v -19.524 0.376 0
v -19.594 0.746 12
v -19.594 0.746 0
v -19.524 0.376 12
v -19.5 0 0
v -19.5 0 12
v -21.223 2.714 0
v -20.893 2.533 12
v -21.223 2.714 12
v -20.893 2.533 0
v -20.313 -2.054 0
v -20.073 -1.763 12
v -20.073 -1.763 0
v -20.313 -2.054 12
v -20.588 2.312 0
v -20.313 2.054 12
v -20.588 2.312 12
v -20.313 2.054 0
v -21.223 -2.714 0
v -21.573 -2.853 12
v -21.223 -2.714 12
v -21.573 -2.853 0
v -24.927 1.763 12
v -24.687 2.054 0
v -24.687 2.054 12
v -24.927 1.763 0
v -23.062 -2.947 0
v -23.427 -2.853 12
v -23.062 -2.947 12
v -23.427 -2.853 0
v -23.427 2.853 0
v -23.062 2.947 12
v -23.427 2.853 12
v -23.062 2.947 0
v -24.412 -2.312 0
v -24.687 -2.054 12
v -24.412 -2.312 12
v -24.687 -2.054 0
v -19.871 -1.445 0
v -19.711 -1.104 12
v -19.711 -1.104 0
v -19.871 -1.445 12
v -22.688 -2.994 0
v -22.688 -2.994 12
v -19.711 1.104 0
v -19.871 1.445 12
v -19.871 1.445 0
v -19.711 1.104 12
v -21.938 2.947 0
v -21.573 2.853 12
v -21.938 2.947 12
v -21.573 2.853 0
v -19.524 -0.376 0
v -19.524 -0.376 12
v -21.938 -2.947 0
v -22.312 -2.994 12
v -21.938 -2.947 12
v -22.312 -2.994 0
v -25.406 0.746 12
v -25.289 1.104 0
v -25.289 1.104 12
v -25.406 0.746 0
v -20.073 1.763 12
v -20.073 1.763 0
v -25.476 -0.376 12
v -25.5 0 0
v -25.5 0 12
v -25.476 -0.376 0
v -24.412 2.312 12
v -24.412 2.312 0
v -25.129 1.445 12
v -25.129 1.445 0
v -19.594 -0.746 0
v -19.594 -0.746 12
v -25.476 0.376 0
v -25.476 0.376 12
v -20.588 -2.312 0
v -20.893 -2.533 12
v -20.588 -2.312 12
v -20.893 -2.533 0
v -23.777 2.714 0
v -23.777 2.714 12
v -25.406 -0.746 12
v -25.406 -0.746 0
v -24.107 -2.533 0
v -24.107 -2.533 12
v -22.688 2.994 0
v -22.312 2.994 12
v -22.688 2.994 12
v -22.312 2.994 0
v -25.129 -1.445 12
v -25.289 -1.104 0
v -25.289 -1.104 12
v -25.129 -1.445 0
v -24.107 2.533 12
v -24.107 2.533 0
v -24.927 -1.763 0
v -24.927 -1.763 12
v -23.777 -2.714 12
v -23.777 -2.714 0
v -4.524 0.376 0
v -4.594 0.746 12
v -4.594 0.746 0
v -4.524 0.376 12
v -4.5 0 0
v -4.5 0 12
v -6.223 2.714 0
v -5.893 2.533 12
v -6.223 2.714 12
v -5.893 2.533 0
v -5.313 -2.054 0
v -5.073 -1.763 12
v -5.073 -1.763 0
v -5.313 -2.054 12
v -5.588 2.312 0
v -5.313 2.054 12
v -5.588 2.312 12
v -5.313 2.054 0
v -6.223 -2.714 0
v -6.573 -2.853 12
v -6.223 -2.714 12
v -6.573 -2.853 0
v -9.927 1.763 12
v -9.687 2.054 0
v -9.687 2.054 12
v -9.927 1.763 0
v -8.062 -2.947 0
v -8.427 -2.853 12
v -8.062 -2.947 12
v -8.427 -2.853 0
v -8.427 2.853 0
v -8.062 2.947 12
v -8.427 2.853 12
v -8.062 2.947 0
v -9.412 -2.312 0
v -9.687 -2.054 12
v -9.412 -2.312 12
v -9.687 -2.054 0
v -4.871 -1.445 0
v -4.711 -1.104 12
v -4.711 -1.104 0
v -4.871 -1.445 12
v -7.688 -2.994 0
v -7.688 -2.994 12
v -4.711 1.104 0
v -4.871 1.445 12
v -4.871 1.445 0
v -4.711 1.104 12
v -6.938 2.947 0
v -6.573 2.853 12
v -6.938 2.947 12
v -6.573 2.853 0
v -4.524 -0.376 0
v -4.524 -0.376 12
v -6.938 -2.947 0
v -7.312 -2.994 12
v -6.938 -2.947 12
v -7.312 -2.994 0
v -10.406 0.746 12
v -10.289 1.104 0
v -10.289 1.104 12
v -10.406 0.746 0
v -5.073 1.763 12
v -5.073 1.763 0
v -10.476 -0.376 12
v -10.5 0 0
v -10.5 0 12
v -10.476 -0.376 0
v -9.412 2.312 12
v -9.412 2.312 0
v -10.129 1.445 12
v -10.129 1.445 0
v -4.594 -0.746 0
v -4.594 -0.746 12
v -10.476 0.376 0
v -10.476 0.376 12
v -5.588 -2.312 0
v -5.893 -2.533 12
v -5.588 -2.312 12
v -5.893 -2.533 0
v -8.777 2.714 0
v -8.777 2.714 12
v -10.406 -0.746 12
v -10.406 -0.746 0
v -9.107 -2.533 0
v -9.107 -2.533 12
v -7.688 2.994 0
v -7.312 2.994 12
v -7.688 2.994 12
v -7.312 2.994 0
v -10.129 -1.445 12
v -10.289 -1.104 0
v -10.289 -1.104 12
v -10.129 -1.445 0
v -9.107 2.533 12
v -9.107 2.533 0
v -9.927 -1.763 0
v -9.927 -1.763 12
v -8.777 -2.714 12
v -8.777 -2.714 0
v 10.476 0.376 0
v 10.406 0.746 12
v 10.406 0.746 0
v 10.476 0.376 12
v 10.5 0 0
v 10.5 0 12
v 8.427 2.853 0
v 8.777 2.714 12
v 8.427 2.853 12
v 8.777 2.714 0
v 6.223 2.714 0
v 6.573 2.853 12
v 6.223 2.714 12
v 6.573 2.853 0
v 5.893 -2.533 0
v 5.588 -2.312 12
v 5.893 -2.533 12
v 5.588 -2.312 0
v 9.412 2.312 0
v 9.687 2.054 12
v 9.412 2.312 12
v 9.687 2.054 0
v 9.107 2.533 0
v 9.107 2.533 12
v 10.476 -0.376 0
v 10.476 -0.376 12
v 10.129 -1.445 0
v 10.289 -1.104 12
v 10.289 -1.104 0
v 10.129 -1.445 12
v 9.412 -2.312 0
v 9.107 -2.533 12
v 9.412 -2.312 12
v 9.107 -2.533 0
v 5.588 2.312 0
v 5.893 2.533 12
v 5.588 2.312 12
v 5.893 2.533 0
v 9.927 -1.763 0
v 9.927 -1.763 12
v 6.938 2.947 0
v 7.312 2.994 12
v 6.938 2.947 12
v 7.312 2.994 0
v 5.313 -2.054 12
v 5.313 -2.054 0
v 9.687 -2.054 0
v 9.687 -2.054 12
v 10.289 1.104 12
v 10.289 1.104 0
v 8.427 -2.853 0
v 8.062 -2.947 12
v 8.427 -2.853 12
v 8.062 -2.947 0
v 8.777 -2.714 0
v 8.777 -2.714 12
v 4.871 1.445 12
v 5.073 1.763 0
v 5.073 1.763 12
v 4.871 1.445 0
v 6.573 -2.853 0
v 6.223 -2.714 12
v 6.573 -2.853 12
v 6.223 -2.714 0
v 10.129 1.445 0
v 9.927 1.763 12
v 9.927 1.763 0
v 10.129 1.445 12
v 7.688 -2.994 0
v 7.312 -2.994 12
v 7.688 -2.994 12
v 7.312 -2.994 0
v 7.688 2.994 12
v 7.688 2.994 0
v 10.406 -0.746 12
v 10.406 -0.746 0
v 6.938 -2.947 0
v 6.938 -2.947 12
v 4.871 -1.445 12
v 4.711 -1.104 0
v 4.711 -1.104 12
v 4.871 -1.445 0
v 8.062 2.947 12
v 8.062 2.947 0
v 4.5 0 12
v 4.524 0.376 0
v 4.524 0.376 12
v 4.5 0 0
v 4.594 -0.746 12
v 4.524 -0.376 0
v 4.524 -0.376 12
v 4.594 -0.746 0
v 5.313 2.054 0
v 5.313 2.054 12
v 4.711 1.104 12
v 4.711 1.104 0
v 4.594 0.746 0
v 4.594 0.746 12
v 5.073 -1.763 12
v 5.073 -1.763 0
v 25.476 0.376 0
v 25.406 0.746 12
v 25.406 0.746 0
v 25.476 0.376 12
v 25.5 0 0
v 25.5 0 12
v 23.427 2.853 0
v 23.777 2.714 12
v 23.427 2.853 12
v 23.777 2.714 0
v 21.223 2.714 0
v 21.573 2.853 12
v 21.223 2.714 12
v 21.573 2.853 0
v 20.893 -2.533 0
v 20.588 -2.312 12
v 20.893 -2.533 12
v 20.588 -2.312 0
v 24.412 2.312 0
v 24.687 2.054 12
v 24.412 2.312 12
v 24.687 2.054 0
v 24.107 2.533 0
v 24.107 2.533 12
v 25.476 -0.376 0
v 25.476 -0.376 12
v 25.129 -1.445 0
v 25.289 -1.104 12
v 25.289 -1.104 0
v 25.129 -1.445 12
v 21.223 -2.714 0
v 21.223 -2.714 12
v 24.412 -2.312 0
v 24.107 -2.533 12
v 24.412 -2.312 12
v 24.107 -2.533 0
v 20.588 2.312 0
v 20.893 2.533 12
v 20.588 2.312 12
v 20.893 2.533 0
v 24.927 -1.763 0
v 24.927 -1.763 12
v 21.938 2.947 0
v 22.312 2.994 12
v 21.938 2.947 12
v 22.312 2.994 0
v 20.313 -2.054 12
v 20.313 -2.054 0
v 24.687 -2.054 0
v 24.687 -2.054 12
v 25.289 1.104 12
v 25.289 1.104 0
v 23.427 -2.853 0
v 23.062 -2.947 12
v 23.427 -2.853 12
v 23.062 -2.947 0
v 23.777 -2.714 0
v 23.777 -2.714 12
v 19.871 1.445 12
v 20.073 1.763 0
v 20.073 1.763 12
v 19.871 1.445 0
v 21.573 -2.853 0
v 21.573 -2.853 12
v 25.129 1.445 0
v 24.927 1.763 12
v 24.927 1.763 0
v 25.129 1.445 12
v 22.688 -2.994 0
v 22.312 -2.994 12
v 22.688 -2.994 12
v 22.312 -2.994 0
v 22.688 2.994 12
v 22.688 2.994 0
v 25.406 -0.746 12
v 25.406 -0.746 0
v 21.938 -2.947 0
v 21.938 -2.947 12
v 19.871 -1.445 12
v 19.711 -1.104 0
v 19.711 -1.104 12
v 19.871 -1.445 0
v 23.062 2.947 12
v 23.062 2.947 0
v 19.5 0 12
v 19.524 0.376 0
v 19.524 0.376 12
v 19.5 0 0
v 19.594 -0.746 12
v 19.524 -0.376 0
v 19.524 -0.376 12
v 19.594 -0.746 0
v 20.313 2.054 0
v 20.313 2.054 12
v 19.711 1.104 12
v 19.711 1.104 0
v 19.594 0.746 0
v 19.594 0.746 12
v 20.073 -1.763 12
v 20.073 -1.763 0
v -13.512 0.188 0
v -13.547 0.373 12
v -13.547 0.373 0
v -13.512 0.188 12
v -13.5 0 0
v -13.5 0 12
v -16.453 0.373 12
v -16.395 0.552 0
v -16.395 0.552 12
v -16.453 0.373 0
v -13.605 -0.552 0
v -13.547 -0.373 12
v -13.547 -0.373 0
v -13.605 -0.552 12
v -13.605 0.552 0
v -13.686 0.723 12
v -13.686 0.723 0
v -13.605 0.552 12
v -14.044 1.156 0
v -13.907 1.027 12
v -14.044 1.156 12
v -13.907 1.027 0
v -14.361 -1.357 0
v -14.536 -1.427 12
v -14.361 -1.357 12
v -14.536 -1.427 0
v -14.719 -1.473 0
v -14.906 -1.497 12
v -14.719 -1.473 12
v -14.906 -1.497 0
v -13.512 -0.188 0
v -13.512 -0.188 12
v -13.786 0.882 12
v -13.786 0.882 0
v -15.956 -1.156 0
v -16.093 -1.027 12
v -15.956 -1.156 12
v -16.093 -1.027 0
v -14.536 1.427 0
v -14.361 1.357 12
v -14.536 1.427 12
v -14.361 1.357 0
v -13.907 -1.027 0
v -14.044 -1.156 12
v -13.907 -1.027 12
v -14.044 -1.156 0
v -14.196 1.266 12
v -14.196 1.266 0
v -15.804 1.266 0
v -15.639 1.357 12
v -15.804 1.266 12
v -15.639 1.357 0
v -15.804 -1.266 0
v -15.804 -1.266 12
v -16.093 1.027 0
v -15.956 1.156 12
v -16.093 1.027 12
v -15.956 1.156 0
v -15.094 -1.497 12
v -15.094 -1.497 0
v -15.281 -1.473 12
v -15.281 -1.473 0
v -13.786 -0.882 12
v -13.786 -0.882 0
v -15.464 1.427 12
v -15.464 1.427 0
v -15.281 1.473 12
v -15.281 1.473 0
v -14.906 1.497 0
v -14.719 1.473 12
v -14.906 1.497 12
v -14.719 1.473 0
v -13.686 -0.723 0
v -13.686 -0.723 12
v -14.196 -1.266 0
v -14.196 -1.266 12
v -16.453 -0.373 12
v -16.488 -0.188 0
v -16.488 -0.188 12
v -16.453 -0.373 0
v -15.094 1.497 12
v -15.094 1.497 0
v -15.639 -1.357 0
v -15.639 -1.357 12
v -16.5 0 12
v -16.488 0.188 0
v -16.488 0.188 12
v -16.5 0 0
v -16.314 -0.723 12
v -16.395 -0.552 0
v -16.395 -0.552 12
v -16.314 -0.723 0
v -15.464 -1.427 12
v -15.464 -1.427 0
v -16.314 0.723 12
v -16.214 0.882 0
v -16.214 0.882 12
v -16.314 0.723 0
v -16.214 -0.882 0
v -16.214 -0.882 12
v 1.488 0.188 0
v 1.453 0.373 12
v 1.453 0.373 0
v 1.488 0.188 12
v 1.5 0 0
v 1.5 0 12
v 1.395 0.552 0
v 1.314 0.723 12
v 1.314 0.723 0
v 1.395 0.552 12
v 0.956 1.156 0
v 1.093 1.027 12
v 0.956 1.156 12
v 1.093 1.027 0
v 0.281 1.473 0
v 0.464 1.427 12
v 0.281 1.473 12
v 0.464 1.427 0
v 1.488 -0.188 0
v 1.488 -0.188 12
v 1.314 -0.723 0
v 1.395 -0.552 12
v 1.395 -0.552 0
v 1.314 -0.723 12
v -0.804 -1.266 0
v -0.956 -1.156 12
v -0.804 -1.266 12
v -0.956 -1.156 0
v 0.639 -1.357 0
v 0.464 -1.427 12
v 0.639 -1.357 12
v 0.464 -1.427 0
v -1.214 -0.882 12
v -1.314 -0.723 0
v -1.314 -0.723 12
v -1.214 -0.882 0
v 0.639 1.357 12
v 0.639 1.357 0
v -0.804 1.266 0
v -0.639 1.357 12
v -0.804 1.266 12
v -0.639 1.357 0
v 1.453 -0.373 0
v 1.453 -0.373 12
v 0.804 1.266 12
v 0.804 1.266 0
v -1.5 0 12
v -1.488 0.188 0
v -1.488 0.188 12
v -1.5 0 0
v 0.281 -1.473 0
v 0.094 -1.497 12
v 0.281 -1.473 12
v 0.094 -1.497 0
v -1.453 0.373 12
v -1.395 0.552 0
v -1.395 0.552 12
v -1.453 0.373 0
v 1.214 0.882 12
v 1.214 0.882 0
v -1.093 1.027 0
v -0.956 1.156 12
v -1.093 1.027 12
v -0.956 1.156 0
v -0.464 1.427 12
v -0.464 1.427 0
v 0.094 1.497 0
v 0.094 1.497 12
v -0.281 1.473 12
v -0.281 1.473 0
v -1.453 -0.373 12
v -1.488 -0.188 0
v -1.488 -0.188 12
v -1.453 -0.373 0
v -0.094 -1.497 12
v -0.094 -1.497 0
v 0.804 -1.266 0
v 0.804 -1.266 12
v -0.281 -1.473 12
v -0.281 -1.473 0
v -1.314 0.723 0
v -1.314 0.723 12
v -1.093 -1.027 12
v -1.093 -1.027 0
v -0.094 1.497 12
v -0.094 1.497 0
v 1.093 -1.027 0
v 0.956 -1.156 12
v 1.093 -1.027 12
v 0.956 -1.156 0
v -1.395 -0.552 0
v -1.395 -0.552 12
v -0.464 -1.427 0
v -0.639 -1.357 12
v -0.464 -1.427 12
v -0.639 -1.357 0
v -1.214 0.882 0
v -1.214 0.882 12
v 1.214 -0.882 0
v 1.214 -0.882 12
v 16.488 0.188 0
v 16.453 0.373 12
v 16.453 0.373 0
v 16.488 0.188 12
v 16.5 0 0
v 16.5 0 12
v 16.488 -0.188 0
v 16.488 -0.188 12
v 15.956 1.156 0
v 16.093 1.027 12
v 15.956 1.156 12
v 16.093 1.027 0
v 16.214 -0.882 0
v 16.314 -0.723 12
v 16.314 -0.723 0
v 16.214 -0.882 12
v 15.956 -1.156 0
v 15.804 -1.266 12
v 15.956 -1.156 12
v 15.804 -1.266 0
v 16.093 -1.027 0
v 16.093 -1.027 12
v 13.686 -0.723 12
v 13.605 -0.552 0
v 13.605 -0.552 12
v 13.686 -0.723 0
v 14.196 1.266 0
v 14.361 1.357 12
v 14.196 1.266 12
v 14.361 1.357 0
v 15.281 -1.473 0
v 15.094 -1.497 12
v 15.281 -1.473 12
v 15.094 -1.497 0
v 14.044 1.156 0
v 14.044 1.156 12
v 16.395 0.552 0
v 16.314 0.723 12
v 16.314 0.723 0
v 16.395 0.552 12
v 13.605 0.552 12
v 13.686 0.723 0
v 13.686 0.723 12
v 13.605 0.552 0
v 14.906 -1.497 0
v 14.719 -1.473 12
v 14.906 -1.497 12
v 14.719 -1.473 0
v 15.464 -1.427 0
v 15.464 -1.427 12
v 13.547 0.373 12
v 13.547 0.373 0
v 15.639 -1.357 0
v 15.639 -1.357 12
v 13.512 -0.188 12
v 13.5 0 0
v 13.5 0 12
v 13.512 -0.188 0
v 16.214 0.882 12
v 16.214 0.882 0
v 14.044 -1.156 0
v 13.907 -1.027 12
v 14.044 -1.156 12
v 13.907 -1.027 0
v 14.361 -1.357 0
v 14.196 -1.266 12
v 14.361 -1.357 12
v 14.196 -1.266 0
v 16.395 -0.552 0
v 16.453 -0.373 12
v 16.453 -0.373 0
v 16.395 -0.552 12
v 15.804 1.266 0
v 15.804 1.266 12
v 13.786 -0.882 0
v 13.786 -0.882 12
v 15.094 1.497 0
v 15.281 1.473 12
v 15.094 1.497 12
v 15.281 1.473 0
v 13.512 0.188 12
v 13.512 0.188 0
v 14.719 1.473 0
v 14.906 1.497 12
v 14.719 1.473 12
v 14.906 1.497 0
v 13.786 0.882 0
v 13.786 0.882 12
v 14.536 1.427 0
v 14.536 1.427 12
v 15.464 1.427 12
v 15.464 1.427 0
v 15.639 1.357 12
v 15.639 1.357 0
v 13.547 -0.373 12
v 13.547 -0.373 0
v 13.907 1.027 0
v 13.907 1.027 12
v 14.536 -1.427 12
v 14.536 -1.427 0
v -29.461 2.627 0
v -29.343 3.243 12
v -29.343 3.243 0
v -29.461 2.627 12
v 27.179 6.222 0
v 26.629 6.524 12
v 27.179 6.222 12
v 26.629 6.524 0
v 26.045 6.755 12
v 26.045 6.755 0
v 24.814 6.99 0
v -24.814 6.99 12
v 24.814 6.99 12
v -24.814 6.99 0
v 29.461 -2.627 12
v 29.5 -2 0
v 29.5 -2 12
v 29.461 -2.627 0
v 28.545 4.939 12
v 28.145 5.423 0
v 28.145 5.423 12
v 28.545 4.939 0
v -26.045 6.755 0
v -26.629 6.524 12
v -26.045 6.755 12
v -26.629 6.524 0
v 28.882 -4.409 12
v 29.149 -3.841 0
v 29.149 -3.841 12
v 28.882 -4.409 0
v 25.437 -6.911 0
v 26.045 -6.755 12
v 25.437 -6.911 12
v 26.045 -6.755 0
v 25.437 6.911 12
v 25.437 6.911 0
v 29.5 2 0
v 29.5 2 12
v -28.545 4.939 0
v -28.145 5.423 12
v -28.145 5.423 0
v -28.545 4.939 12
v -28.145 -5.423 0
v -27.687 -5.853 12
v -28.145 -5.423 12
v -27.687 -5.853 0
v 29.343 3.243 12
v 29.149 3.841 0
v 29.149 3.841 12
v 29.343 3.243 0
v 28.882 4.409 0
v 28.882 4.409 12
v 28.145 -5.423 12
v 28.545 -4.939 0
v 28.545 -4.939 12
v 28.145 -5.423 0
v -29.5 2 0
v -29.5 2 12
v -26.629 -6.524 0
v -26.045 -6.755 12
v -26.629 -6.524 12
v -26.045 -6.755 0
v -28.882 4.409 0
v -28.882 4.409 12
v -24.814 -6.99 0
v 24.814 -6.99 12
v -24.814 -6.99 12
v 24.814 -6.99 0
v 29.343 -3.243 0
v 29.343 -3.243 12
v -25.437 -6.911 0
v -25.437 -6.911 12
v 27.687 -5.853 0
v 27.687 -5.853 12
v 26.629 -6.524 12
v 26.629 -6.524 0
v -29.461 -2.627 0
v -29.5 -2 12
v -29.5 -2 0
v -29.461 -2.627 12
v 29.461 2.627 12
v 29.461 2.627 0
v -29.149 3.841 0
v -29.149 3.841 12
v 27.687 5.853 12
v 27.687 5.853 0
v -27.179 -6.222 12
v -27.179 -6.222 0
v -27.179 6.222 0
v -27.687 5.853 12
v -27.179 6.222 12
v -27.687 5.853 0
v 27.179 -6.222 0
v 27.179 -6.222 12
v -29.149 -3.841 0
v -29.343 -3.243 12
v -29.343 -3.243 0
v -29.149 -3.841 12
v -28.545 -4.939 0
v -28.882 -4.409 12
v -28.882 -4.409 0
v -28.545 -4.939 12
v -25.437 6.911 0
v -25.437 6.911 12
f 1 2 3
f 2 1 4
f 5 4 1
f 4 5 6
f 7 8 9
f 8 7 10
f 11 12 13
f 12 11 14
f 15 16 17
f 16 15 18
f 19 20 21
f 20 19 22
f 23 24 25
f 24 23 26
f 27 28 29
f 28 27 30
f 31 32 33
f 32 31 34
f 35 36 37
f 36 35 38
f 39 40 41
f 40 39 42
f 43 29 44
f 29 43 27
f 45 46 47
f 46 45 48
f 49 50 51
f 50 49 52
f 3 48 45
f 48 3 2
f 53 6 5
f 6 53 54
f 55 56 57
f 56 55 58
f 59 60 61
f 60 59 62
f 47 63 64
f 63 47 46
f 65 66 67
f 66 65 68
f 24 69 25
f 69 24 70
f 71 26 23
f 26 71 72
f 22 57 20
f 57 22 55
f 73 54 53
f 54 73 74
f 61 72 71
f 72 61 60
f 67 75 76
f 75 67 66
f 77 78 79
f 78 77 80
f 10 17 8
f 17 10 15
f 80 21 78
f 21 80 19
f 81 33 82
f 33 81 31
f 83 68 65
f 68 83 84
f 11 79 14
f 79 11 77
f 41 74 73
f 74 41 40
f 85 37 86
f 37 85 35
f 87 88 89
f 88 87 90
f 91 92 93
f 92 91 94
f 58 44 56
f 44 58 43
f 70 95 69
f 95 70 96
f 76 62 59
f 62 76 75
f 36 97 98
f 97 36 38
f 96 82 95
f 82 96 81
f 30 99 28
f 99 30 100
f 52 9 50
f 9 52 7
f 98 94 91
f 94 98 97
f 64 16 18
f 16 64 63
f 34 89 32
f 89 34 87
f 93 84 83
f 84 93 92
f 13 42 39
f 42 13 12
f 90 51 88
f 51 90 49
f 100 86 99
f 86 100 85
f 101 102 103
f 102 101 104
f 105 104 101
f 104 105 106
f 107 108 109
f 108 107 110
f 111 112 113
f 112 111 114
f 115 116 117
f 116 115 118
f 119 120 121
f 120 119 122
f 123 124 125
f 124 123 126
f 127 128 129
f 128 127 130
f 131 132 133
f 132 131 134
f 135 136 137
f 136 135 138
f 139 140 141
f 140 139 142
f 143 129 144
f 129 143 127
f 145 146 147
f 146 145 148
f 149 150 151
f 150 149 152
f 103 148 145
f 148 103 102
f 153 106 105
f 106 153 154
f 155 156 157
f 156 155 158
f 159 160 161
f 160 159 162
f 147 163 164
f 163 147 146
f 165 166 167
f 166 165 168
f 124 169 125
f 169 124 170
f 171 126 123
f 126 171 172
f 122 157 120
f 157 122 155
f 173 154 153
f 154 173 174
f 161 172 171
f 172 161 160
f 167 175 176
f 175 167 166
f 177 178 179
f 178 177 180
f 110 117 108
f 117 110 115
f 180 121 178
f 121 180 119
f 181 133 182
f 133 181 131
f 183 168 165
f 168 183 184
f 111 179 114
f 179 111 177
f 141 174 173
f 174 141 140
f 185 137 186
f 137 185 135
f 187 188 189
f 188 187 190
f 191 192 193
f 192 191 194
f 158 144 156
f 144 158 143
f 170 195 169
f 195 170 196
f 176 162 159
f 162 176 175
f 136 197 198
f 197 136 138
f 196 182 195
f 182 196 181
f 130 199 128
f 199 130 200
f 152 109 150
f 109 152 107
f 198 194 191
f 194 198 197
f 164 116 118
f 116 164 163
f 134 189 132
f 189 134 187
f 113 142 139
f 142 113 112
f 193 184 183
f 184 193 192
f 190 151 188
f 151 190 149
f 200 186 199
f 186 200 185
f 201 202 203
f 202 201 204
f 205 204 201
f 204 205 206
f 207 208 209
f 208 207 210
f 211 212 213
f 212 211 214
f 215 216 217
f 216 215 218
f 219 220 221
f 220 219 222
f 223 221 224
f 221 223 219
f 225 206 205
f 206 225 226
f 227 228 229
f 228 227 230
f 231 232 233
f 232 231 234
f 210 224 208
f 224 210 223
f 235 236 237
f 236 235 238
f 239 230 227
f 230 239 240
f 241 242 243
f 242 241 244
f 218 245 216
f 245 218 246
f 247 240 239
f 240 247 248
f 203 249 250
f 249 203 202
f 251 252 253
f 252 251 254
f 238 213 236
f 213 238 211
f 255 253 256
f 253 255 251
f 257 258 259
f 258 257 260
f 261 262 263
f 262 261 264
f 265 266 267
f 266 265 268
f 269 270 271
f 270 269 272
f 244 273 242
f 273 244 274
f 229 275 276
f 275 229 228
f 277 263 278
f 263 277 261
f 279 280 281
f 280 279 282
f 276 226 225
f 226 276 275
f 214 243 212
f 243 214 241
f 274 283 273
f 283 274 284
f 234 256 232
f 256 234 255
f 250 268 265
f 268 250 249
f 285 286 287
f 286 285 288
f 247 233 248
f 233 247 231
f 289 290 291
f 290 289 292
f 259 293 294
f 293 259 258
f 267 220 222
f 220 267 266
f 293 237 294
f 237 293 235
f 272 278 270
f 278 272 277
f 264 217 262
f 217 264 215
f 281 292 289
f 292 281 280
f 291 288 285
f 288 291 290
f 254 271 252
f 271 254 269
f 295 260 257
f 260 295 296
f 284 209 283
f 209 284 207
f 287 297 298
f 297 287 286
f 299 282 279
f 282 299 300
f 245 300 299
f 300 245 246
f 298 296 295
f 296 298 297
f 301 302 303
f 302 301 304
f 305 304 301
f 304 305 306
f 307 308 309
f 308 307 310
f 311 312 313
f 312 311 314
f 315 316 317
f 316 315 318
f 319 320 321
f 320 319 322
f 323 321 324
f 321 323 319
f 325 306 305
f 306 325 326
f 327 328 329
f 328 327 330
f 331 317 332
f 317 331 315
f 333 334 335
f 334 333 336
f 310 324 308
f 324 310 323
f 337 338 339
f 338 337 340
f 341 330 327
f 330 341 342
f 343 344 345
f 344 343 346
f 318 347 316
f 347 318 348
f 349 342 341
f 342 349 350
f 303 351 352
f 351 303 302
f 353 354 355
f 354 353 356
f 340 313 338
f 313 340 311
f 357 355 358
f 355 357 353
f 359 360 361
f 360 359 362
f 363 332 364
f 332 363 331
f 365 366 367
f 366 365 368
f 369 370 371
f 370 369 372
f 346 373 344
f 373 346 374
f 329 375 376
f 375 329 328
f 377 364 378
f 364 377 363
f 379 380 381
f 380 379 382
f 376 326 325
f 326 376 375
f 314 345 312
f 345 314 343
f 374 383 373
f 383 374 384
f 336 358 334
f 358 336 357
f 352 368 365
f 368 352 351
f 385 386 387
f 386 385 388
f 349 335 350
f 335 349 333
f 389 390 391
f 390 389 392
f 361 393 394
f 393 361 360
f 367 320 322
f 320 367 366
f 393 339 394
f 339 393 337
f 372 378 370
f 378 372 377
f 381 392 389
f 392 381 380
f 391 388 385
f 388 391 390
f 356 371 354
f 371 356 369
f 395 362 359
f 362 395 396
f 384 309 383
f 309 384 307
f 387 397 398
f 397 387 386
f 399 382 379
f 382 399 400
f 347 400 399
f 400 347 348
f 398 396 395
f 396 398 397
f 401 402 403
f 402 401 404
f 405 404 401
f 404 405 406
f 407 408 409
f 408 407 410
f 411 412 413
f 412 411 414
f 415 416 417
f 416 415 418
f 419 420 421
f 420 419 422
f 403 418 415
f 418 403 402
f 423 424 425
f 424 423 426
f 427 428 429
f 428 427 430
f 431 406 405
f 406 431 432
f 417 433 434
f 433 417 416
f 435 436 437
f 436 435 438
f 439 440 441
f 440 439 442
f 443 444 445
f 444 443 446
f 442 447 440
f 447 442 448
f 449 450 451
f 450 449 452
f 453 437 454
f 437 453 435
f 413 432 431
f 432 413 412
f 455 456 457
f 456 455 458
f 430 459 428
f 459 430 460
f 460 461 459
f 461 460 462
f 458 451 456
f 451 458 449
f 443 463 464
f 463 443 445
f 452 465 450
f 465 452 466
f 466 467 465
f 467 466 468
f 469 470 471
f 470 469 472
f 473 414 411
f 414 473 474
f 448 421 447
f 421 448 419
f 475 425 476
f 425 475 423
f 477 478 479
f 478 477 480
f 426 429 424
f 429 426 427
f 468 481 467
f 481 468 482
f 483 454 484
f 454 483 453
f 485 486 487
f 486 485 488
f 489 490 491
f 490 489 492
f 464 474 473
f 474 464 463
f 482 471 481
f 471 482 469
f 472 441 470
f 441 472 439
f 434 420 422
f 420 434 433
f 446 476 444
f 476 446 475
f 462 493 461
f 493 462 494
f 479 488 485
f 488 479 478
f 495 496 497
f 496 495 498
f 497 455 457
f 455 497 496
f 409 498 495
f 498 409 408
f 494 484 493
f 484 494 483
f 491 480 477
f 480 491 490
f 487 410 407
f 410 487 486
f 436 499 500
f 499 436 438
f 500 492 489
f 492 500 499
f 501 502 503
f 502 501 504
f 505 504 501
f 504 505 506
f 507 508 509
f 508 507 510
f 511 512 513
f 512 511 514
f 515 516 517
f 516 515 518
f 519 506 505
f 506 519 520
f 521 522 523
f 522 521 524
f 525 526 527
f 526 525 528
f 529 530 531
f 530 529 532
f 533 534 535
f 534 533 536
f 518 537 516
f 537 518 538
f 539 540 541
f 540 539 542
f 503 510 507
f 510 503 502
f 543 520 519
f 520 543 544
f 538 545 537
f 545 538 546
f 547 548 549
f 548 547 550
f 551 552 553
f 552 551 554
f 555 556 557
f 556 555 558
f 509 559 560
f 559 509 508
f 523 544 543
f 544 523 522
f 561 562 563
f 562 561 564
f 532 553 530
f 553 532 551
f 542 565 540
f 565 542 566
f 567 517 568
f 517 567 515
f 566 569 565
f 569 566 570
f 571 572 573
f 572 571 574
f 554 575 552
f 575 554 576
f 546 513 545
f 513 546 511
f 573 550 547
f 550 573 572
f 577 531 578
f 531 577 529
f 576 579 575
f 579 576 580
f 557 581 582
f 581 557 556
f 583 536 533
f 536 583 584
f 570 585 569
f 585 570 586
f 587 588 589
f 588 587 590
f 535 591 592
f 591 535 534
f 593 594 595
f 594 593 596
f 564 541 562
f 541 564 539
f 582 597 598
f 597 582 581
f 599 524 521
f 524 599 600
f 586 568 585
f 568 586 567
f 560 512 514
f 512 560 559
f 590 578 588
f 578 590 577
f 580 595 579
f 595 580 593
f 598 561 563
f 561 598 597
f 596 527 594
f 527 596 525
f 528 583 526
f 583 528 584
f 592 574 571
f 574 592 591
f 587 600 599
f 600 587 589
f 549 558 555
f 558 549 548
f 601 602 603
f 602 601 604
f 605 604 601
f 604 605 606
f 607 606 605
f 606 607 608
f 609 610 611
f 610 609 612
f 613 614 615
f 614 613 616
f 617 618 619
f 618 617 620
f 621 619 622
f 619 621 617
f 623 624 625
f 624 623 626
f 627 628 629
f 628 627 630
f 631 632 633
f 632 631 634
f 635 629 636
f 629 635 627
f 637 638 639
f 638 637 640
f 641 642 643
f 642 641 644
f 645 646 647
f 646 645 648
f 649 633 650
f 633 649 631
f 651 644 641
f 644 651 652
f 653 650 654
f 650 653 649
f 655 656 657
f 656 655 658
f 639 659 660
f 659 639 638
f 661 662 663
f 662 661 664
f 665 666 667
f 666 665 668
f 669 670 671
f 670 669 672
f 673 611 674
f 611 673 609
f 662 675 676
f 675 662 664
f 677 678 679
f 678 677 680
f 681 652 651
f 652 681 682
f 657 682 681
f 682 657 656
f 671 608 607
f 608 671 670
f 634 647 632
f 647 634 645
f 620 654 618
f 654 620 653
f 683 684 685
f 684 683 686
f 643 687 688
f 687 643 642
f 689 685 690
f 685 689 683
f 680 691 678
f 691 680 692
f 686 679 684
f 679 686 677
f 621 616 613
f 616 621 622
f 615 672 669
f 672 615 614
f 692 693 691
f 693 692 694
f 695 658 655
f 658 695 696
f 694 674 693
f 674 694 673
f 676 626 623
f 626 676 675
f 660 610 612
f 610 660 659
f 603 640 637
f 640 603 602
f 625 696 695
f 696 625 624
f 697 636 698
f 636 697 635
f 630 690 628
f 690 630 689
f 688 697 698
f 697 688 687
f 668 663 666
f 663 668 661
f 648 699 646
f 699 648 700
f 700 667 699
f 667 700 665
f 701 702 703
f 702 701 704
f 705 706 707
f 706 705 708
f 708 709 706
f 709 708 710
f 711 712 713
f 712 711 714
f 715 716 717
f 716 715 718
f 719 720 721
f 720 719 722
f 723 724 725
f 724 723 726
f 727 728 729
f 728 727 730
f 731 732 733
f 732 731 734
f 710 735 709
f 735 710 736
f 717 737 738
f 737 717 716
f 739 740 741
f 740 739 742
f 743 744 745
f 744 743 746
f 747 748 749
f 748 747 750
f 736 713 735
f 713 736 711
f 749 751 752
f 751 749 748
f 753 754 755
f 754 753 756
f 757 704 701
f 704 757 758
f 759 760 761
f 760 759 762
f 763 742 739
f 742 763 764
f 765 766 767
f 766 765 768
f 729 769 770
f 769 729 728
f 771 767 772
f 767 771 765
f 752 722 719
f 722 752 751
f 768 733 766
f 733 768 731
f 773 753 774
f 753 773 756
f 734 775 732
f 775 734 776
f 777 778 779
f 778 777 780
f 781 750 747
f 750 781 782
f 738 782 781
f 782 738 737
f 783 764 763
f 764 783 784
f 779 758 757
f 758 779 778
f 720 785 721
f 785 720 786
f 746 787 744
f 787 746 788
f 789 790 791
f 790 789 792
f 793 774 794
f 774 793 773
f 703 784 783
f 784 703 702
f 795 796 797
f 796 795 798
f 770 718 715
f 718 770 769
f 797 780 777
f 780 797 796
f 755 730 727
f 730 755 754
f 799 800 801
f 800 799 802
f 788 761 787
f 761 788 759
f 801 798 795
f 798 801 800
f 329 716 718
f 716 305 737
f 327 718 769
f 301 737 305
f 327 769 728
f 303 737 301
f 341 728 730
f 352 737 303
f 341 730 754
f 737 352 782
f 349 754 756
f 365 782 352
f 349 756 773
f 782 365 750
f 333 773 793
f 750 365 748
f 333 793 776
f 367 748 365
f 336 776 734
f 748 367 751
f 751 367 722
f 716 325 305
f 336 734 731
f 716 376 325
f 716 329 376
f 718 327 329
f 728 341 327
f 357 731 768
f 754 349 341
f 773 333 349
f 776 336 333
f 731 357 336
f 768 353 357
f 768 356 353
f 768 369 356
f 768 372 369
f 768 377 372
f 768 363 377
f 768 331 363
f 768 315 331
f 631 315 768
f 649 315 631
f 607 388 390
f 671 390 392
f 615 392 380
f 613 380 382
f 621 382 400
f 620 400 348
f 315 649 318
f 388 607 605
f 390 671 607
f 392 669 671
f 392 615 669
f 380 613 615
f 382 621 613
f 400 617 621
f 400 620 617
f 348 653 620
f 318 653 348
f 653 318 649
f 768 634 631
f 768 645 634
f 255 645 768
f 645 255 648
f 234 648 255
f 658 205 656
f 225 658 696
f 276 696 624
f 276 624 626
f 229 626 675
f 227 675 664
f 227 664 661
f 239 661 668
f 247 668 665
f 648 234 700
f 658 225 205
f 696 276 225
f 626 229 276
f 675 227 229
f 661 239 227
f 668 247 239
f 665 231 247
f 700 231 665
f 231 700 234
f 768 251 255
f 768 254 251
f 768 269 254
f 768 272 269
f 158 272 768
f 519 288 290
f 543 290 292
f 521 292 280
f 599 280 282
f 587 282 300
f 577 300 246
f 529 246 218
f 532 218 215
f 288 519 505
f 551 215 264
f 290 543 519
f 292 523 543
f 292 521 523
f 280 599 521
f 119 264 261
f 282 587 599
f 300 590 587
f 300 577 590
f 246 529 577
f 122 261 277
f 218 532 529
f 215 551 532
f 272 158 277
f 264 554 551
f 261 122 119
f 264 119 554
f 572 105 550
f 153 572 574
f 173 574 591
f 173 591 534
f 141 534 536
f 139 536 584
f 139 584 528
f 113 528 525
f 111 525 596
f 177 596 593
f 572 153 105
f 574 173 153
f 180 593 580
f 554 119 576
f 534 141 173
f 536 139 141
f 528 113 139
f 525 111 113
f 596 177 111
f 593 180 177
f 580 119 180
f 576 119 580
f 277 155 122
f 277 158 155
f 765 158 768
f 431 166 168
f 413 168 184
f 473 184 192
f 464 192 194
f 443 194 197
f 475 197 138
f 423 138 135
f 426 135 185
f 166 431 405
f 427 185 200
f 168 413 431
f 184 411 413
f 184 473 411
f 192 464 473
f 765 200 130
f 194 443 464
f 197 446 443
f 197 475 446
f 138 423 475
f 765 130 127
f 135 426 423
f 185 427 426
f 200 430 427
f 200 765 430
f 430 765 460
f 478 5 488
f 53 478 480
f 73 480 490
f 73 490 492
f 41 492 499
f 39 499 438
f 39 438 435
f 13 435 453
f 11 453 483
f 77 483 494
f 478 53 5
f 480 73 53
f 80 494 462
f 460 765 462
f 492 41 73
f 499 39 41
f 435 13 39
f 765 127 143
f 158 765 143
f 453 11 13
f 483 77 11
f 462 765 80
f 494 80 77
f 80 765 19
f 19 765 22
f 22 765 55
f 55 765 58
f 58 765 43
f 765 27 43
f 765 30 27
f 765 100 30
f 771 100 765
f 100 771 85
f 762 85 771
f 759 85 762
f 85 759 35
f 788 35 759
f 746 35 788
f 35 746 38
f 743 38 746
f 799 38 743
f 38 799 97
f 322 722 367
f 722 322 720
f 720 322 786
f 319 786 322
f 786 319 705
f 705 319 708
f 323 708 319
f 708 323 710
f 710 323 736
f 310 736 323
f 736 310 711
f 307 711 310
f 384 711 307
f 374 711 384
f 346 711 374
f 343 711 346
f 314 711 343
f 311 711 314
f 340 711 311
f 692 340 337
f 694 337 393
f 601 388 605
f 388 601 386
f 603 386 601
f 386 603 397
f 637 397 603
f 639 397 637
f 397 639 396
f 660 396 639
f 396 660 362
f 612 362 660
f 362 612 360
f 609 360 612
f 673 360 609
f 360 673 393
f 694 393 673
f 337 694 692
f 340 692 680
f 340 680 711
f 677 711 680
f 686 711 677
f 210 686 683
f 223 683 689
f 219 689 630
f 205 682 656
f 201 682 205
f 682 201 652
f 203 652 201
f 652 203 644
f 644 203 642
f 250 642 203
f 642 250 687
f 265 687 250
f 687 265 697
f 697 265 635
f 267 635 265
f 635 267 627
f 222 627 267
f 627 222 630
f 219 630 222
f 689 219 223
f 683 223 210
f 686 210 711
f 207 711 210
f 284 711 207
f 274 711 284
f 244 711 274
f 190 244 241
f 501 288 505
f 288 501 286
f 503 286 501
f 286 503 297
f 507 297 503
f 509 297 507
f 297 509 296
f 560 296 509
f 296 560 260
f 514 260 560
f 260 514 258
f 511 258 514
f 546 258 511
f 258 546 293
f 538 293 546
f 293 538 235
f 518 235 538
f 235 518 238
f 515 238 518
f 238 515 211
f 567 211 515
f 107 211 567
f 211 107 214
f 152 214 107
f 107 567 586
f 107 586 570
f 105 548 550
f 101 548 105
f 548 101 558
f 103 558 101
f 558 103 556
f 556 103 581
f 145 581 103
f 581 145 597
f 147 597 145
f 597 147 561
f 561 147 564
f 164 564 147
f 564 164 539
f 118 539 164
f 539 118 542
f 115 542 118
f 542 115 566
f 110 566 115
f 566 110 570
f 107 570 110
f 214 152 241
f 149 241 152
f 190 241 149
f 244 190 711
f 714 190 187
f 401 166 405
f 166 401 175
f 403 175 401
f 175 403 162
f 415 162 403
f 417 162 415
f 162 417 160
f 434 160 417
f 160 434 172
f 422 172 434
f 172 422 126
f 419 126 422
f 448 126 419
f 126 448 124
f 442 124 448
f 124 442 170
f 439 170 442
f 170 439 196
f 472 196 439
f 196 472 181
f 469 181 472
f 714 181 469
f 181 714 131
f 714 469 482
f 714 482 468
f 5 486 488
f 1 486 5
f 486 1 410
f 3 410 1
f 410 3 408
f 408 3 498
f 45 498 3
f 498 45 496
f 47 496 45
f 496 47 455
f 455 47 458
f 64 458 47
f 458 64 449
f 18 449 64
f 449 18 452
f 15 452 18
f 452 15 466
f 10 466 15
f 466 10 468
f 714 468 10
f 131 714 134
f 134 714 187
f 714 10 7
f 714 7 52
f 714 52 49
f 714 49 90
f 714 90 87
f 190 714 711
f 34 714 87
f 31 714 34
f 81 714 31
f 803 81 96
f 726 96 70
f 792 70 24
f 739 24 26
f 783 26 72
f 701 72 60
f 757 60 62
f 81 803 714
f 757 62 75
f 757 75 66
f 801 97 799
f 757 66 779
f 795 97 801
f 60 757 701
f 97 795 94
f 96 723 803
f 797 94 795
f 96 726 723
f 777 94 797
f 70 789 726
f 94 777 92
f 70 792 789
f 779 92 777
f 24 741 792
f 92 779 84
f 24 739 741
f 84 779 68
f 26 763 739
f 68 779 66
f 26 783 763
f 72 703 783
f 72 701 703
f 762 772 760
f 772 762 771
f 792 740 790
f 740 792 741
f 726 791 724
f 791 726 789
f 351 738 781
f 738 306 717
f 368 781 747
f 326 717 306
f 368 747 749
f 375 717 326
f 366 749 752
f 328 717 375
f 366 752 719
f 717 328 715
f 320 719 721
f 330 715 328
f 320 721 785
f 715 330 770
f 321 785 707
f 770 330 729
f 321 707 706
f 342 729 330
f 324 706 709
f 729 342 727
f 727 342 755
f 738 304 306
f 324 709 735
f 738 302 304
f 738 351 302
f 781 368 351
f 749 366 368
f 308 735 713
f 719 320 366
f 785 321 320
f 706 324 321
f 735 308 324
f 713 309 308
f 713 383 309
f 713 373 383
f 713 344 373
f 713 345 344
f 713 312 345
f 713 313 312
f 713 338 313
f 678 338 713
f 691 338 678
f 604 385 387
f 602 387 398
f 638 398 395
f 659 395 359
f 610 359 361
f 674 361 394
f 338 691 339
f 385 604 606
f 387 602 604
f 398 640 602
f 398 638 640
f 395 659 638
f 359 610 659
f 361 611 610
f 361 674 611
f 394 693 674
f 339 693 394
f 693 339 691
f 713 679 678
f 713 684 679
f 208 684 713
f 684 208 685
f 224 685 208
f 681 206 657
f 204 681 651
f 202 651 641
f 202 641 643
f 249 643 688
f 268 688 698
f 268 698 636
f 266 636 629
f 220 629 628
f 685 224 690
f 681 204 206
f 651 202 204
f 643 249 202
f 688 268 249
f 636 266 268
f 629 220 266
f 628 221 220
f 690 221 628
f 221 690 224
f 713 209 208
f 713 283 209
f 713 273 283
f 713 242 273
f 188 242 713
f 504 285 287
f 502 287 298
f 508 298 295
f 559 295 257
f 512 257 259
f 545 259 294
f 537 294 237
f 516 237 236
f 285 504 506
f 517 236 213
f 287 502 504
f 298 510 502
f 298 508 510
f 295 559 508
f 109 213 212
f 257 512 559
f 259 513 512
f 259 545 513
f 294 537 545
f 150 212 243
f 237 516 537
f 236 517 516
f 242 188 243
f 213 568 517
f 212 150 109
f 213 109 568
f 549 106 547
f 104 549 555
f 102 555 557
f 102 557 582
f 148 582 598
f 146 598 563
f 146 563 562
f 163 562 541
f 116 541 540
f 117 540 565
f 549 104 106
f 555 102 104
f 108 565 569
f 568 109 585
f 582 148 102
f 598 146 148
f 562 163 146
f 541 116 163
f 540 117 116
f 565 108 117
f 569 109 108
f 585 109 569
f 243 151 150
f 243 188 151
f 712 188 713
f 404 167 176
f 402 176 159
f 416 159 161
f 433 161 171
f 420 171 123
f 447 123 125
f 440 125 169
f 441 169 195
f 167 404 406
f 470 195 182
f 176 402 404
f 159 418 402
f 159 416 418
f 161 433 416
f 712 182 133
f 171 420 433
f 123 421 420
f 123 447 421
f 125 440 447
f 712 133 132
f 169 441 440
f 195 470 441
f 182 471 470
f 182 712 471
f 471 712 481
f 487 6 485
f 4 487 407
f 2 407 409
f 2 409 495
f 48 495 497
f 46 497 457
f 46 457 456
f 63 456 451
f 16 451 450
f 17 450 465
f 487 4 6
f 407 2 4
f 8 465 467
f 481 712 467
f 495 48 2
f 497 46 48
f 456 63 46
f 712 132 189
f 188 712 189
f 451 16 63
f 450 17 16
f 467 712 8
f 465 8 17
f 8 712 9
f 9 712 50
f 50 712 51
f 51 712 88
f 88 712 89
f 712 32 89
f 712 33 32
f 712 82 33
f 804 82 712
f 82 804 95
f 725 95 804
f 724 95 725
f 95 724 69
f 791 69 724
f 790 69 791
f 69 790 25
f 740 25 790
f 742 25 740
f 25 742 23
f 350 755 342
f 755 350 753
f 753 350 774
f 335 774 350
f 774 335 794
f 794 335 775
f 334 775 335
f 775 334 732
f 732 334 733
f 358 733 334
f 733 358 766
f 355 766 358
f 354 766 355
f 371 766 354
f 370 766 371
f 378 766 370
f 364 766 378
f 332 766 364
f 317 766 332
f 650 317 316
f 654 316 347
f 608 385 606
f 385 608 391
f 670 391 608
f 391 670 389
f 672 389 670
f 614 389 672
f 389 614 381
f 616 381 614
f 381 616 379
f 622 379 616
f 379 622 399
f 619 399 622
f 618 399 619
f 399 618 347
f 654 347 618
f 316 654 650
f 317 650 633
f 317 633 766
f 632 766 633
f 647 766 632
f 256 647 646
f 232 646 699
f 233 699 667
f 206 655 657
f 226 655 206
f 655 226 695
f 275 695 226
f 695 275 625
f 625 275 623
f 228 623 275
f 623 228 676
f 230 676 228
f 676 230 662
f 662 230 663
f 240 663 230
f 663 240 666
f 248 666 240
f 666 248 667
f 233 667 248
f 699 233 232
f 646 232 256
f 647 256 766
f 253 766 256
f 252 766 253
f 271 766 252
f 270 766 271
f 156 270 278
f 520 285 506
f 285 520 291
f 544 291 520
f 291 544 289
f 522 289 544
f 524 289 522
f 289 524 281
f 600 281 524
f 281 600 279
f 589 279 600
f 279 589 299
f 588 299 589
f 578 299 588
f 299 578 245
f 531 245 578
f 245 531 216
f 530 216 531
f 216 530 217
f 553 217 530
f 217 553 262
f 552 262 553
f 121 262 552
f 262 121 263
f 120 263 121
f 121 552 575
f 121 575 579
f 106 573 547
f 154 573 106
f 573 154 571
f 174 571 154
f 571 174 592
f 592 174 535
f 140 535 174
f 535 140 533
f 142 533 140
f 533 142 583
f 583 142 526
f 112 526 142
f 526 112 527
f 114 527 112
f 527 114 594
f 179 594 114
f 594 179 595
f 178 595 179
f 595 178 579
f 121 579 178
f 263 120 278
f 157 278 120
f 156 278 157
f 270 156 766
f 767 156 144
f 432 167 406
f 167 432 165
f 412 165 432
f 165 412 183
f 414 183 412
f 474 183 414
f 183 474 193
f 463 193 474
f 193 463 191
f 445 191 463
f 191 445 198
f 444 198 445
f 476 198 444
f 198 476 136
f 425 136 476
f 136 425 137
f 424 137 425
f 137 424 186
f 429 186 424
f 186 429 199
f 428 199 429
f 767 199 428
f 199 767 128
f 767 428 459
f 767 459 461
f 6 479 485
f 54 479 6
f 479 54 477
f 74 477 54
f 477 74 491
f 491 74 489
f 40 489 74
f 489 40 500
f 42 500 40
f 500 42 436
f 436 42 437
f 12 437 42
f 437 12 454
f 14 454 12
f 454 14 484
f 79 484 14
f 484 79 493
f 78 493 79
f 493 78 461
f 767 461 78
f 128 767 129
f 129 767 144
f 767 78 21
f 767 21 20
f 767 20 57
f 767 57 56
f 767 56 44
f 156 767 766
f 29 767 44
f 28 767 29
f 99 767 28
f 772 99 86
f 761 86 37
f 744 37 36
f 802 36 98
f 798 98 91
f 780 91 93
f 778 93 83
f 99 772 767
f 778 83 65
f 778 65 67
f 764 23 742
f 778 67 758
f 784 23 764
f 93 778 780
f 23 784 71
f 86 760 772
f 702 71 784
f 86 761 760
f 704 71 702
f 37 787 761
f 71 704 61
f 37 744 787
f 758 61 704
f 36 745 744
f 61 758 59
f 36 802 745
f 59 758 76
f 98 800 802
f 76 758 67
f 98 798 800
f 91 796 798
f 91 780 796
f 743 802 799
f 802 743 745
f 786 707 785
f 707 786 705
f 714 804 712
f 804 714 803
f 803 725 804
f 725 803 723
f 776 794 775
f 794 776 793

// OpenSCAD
$fn = 50;


difference() {
	union() {
		hull() {
			translate(v = [-24.5000000000, 2.0000000000, 0]) {
				cylinder(h = 12, r = 5);
			}
			translate(v = [24.5000000000, 2.0000000000, 0]) {
				cylinder(h = 12, r = 5);
			}
			translate(v = [-24.5000000000, -2.0000000000, 0]) {
				cylinder(h = 12, r = 5);
			}
			translate(v = [24.5000000000, -2.0000000000, 0]) {
				cylinder(h = 12, r = 5);
			}
		}
	}
	union() {
		translate(v = [-22.5000000000, 0.0000000000, 0]) {
			translate(v = [0, 0, -100]) {
				cylinder(h = 200, r = 3.0000000000);
			}
		}
		translate(v = [-7.5000000000, 0.0000000000, 0]) {
			translate(v = [0, 0, -100]) {
				cylinder(h = 200, r = 3.0000000000);
			}
		}
		translate(v = [7.5000000000, 0.0000000000, 0]) {
			translate(v = [0, 0, -100]) {
				cylinder(h = 200, r = 3.0000000000);
			}
		}
		translate(v = [22.5000000000, 0.0000000000, 0]) {
			translate(v = [0, 0, -100]) {
				cylinder(h = 200, r = 3.0000000000);
			}
		}
		translate(v = [-22.5000000000, 0.0000000000, 0]) {
			translate(v = [0, 0, -100]) {
				cylinder(h = 200, r = 1.5000000000);
			}
		}
		translate(v = [-15.0000000000, 0.0000000000, 0]) {
			translate(v = [0, 0, -100]) {
				cylinder(h = 200, r = 1.5000000000);
			}
		}
		translate(v = [-7.5000000000, 0.0000000000, 0]) {
			translate(v = [0, 0, -100]) {
				cylinder(h = 200, r = 1.5000000000);
			}
		}
		translate(v = [0, 0, -100]) {
			cylinder(h = 200, r = 1.5000000000);
		}
		translate(v = [7.5000000000, 0.0000000000, 0]) {
			translate(v = [0, 0, -100]) {
				cylinder(h = 200, r = 1.5000000000);
			}
		}
		translate(v = [15.0000000000, 0.0000000000, 0]) {
			translate(v = [0, 0, -100]) {
				cylinder(h = 200, r = 1.5000000000);
			}
		}
		translate(v = [22.5000000000, 0.0000000000, 0]) {
			translate(v = [0, 0, -100]) {
				cylinder(h = 200, r = 1.5000000000);
			}
		}
	}
}
